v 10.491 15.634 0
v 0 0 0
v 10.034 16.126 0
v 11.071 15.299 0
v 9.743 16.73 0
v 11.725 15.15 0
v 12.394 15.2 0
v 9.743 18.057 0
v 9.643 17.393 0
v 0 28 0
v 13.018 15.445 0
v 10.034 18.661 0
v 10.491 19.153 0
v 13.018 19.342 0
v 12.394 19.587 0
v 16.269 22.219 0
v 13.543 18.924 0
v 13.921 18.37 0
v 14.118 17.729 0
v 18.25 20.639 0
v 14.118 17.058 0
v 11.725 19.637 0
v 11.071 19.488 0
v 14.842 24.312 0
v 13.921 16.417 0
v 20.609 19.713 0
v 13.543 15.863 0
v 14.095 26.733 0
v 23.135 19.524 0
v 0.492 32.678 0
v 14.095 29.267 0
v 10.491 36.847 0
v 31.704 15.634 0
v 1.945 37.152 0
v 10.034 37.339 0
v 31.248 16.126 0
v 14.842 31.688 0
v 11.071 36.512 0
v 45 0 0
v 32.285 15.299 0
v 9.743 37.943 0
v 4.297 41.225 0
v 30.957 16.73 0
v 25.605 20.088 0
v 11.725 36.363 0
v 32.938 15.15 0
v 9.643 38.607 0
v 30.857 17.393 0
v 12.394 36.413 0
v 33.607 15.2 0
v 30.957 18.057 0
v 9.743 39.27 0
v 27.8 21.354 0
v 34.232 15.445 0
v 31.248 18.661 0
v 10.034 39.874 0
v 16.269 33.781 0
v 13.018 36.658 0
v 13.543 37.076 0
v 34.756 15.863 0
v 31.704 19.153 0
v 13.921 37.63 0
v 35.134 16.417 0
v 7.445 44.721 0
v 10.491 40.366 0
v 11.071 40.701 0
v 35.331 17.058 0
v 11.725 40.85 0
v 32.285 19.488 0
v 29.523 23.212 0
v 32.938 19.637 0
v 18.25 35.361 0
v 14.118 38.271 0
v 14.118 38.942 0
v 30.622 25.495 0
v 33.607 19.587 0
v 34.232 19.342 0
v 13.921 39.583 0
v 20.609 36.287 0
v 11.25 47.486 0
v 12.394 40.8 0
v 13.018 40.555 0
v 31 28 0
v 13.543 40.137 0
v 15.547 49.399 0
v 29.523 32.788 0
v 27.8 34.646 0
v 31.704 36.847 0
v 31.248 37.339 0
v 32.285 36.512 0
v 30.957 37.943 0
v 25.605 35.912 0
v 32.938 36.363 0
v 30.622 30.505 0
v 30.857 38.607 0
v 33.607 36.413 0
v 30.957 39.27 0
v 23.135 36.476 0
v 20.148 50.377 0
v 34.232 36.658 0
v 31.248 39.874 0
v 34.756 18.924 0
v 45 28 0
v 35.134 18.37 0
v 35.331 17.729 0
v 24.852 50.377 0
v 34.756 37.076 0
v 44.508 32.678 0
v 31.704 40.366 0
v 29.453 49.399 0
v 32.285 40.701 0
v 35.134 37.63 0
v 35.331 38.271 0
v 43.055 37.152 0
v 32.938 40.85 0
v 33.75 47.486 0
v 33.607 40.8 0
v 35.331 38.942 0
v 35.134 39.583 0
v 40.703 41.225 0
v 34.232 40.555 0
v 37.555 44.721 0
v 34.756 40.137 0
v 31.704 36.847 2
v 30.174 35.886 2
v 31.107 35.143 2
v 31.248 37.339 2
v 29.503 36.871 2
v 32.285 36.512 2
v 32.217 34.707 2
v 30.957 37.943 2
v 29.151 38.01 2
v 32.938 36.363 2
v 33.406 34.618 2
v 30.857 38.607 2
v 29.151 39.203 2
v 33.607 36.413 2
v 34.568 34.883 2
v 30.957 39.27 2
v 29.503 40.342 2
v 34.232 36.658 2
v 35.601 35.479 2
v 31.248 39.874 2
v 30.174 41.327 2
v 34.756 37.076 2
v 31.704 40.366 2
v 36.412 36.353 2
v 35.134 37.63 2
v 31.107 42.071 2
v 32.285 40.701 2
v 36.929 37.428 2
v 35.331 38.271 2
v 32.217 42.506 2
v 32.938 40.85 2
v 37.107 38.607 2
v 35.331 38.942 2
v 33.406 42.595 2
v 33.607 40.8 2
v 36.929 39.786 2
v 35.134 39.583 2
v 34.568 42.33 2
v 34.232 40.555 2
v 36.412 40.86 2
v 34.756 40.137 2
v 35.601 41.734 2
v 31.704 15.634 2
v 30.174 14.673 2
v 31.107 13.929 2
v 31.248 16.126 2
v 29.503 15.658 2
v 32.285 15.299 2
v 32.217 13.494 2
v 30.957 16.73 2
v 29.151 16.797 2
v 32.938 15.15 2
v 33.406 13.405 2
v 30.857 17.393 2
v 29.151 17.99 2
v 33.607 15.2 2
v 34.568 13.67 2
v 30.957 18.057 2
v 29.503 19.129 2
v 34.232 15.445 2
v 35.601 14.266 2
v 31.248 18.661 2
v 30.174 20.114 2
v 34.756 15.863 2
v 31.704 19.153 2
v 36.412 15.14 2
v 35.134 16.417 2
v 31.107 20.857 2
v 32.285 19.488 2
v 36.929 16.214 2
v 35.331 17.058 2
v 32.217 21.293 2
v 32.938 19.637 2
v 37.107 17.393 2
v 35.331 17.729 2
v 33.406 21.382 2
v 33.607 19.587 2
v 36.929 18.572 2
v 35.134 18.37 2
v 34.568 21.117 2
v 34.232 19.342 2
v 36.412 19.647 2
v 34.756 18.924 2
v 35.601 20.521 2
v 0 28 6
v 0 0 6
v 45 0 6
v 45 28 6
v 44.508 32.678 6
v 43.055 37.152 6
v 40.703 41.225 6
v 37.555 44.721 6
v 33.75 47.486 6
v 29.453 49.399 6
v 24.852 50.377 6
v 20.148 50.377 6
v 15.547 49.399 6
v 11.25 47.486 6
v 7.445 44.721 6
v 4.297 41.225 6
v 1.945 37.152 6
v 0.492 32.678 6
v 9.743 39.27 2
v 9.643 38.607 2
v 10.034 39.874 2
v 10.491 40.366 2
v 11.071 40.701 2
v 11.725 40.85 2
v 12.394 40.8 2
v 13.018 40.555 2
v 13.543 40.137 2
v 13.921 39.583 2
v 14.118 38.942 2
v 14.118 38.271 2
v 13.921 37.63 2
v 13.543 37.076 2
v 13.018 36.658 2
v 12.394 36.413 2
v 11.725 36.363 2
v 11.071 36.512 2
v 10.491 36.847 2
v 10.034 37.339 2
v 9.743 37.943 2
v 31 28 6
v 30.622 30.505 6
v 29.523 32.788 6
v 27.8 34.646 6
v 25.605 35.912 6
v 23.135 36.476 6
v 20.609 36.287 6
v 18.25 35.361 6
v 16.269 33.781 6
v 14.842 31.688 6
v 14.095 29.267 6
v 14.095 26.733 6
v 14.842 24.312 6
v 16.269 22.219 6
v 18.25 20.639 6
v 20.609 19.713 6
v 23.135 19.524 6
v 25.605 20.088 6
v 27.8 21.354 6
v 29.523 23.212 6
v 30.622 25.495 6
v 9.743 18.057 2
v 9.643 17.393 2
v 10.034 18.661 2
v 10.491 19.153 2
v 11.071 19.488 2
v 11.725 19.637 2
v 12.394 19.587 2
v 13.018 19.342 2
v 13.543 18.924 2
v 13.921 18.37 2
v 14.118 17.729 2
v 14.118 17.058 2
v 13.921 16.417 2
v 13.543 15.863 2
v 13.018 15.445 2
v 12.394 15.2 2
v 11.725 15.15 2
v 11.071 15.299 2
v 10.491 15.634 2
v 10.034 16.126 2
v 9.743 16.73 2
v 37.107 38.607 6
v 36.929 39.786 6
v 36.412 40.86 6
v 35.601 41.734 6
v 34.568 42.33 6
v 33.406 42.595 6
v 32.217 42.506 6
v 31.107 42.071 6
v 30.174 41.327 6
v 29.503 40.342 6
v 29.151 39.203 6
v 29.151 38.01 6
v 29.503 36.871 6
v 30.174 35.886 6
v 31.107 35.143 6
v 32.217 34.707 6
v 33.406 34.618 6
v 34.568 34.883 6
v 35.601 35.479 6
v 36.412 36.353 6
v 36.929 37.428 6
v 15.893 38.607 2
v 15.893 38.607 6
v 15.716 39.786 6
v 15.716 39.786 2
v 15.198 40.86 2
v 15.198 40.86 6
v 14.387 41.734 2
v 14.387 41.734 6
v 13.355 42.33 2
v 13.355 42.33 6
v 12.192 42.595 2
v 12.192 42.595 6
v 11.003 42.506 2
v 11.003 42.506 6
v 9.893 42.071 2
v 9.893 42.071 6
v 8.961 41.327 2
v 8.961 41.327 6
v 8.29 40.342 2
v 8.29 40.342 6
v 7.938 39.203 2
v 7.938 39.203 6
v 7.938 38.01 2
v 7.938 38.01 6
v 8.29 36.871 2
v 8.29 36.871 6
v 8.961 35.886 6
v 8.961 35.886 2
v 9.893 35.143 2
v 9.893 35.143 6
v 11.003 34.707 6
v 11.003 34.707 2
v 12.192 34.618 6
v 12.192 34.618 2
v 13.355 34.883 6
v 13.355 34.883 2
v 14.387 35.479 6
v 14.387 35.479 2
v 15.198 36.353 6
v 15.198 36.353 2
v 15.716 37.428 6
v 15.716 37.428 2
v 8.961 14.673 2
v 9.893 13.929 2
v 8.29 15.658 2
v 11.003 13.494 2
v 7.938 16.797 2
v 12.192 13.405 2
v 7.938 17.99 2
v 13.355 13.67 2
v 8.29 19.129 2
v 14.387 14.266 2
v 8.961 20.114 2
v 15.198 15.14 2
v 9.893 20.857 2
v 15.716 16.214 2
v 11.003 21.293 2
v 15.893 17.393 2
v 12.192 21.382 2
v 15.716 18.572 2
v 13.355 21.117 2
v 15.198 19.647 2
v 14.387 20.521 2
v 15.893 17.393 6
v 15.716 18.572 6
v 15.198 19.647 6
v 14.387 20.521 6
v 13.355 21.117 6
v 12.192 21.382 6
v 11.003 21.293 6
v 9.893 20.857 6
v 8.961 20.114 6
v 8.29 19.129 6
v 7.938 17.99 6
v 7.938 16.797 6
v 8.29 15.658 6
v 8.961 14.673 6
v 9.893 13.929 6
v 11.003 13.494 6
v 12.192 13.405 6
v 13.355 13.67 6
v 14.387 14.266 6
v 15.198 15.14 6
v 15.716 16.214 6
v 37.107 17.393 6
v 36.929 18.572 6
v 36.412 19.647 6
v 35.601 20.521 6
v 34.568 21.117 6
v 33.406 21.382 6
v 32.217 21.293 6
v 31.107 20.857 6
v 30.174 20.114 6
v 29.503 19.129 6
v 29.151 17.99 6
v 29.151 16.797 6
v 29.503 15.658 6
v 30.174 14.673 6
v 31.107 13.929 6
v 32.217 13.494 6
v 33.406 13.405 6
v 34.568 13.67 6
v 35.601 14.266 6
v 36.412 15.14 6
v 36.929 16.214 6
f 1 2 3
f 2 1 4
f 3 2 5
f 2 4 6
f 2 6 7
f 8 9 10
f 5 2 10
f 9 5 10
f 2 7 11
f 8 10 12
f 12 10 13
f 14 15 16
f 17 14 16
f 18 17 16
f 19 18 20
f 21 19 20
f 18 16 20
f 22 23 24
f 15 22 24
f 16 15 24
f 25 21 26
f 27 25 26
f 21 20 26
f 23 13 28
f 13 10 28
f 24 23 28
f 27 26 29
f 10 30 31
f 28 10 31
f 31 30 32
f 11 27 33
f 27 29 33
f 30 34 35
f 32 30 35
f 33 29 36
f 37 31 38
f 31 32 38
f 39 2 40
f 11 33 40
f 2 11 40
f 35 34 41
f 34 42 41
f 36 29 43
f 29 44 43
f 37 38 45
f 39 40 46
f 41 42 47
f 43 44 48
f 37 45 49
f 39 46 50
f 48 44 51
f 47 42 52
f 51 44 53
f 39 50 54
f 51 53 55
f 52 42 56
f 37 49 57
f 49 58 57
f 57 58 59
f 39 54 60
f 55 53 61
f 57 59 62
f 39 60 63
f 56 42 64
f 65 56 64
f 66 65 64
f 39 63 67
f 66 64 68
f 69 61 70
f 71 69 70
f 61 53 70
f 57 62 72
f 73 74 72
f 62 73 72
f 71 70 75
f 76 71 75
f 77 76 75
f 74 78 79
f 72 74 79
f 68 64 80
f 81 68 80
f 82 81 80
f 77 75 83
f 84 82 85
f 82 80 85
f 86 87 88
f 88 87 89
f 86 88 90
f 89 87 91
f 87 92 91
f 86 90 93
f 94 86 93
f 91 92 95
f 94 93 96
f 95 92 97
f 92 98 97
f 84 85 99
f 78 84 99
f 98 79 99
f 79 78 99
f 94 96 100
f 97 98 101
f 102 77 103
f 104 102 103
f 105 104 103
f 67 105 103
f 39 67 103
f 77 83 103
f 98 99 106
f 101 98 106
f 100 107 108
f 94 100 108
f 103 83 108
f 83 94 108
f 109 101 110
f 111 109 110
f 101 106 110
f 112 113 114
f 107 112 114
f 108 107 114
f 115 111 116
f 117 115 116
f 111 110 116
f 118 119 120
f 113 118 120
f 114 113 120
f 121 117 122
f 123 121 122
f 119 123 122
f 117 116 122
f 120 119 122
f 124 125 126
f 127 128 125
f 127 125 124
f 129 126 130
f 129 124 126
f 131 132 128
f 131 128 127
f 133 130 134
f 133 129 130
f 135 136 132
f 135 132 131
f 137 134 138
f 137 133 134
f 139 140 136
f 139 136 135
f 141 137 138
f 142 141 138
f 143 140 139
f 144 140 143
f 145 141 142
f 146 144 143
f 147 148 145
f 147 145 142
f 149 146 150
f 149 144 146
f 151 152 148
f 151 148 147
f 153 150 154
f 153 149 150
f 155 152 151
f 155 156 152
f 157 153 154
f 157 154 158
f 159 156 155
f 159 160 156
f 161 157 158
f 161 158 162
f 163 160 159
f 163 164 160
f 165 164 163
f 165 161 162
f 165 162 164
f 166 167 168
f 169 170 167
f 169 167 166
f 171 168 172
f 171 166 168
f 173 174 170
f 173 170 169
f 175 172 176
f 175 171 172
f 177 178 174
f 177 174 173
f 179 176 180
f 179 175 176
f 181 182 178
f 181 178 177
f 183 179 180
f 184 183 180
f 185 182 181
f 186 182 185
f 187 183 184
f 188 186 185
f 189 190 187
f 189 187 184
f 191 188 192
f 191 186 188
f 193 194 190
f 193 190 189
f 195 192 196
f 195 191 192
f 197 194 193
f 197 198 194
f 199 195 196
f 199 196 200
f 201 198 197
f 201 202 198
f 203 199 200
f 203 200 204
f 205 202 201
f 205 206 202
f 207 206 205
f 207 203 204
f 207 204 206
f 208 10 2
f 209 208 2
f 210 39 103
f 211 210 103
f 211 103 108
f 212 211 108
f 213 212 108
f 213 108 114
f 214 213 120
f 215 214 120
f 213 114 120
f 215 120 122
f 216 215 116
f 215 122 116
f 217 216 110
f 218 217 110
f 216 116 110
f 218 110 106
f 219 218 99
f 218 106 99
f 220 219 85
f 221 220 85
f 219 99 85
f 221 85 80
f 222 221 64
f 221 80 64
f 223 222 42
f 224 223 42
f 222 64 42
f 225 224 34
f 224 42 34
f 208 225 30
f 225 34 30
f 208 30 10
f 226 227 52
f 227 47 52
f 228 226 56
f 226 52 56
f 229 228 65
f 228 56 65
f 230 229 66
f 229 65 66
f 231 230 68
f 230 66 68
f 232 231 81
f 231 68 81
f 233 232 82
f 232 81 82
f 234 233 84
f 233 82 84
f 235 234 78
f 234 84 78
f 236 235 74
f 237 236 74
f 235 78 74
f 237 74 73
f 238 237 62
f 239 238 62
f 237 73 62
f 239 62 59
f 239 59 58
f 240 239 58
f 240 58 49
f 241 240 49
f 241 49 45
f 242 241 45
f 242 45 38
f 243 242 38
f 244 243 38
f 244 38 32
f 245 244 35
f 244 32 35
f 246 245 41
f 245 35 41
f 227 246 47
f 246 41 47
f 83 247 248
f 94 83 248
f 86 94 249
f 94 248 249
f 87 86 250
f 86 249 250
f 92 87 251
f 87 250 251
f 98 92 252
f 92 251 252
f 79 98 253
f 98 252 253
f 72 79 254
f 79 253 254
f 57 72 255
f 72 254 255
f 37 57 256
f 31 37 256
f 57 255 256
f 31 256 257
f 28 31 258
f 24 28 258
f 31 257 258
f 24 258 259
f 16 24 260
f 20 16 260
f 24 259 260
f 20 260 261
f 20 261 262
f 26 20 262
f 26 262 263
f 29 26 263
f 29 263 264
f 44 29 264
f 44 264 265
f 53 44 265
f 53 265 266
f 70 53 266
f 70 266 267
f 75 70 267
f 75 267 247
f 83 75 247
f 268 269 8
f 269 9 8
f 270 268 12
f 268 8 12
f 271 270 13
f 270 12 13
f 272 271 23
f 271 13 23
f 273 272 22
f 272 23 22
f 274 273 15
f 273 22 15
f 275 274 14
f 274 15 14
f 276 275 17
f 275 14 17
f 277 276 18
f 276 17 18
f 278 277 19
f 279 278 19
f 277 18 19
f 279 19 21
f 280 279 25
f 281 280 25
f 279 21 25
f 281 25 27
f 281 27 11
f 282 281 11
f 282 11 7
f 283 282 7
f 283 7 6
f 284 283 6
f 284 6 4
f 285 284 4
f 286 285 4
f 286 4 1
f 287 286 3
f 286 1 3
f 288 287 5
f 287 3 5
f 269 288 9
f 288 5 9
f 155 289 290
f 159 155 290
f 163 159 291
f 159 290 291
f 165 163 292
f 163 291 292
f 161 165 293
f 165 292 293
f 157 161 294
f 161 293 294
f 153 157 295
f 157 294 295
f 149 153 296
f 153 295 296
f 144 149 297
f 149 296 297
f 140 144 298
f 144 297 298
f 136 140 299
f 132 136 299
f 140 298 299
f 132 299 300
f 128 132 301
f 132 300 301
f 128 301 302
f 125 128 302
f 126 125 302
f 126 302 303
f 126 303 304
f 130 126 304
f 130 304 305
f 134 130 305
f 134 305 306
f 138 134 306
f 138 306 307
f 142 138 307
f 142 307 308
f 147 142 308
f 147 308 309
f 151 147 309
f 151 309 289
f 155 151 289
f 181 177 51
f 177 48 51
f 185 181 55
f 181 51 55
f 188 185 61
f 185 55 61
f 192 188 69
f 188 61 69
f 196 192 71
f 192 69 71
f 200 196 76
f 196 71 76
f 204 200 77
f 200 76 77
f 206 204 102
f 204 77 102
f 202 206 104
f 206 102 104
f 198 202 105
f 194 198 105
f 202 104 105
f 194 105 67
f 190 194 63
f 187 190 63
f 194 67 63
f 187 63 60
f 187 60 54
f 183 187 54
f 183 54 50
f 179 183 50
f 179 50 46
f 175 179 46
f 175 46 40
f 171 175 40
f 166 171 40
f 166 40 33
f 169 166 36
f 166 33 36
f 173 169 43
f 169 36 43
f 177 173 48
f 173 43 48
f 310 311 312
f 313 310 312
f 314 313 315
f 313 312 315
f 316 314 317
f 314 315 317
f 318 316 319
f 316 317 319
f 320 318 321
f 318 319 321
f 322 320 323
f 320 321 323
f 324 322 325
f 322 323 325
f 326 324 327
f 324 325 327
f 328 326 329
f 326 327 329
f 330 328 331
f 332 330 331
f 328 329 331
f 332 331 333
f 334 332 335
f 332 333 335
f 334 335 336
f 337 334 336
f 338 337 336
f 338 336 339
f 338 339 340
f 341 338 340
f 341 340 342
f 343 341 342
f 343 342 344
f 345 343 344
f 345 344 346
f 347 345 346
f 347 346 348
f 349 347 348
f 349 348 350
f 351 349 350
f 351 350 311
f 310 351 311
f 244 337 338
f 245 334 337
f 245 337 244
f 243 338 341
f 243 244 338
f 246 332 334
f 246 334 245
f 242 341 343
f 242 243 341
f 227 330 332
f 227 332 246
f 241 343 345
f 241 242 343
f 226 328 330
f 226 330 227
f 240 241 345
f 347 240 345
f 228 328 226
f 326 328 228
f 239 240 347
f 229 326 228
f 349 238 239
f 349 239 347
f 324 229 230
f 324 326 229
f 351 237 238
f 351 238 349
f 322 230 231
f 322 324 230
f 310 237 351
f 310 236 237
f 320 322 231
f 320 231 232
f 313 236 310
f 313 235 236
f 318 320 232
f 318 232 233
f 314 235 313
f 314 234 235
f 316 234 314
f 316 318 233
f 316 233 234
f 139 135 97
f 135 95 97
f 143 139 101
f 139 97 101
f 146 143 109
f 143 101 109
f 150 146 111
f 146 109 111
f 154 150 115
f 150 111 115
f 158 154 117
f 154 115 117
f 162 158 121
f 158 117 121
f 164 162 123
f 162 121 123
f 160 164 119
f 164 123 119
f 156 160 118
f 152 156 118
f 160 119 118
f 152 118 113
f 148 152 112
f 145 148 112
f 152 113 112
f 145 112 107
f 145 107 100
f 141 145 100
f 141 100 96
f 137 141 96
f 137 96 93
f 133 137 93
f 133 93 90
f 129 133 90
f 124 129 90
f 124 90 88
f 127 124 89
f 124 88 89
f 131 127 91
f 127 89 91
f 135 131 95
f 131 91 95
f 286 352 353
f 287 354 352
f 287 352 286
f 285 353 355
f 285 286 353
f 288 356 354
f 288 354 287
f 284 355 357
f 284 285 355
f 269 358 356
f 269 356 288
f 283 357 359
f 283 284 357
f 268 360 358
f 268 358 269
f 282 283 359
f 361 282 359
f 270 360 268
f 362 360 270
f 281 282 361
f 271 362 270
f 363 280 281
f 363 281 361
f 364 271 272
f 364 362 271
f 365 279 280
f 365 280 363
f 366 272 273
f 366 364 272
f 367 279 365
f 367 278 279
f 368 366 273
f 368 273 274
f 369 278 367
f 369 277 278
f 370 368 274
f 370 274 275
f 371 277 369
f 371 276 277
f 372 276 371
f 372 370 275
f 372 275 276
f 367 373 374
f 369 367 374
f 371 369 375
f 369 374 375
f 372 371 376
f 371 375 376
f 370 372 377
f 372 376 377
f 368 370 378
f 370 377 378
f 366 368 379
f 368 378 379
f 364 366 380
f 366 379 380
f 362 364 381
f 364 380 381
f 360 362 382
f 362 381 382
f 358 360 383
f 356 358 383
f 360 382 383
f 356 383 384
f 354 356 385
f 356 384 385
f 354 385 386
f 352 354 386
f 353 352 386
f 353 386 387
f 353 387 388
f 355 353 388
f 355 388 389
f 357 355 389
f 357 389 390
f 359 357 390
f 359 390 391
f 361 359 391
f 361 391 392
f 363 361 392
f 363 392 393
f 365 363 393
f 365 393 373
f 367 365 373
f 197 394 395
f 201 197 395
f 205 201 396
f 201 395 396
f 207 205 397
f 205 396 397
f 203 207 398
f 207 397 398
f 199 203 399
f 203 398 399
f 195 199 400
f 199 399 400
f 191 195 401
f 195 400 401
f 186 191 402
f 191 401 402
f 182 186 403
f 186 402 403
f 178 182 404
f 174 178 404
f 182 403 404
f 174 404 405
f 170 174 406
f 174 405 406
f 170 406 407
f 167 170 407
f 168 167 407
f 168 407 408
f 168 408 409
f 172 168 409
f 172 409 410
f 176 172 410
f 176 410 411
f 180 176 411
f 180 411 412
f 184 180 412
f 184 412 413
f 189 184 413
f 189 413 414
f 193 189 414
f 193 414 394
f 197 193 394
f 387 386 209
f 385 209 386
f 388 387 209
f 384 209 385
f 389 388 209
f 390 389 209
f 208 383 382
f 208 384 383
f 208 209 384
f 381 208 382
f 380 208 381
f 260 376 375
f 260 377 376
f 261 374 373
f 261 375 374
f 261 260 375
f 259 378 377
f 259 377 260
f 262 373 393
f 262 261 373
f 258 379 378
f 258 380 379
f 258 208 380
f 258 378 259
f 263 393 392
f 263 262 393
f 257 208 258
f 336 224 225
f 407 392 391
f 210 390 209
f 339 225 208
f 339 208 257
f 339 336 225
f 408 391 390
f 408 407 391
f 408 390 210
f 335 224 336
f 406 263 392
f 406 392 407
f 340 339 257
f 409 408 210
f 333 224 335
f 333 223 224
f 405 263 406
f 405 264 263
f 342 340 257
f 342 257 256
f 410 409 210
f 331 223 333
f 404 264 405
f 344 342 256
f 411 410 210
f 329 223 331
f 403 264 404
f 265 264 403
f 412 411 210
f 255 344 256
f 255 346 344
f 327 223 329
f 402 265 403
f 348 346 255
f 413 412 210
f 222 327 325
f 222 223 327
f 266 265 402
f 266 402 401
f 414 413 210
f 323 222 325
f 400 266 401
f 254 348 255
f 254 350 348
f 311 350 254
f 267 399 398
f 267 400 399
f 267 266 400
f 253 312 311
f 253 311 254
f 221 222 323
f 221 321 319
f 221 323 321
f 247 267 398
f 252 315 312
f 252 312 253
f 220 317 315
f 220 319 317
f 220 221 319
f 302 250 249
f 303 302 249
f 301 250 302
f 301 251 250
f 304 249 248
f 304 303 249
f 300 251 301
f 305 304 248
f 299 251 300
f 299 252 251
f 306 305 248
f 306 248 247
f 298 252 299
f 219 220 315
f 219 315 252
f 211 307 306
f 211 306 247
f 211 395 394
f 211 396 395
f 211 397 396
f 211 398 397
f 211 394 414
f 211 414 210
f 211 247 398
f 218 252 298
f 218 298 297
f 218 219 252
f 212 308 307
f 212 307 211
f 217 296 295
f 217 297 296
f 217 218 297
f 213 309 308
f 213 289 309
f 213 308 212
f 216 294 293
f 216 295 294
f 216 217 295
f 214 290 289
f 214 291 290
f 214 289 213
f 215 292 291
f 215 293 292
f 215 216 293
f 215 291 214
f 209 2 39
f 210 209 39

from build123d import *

# Parameters (mm, degrees)
EXTRUDE_1_DEPTH             = 6
SKETCH_2_R                  = 8.5
CUT_EXTRUDE_1_DEPTH         = 68.906185285
HOLE_WIZARD_M41_D           = 4.5
HOLE_WIZARD_M41_CBORE_D     = 8
HOLE_WIZARD_M41_CBORE_DEPTH = 4


with BuildPart() as part:
    # Эскиз1 → Бобышка-Вытянуть1 (new body)
    with BuildSketch(Plane.XY):
        with BuildLine():
            Line((0, 28), (0, 0))
            Line((0, 0), (45, 0))
            Line((45, 0), (45, 28))
            ThreePointArc((45, 28), (22.5, 50.5), (0, 28))
        make_face()
    extrude(amount=EXTRUDE_1_DEPTH)

    # Эскиз2 → Вырез-Вытянуть1 (cut, through all)
    with BuildSketch(Plane.XY.offset(6)):
        with Locations((22.5, 28)):
            Circle(SKETCH_2_R)
    extrude(amount=-CUT_EXTRUDE_1_DEPTH, mode=Mode.SUBTRACT)

    # Цековка для винта с внутренним шестигранником M41 (through all)
    with Locations(Plane.XY.offset(6)):
        with Locations((11.893398282, 38.606601718), (33.106601718, 38.606601718), (33.106601718, 17.393398282), (11.893398282, 17.393398282)):
            CounterBoreHole(HOLE_WIZARD_M41_D / 2, HOLE_WIZARD_M41_CBORE_D / 2, HOLE_WIZARD_M41_CBORE_DEPTH)


solid = part.part
